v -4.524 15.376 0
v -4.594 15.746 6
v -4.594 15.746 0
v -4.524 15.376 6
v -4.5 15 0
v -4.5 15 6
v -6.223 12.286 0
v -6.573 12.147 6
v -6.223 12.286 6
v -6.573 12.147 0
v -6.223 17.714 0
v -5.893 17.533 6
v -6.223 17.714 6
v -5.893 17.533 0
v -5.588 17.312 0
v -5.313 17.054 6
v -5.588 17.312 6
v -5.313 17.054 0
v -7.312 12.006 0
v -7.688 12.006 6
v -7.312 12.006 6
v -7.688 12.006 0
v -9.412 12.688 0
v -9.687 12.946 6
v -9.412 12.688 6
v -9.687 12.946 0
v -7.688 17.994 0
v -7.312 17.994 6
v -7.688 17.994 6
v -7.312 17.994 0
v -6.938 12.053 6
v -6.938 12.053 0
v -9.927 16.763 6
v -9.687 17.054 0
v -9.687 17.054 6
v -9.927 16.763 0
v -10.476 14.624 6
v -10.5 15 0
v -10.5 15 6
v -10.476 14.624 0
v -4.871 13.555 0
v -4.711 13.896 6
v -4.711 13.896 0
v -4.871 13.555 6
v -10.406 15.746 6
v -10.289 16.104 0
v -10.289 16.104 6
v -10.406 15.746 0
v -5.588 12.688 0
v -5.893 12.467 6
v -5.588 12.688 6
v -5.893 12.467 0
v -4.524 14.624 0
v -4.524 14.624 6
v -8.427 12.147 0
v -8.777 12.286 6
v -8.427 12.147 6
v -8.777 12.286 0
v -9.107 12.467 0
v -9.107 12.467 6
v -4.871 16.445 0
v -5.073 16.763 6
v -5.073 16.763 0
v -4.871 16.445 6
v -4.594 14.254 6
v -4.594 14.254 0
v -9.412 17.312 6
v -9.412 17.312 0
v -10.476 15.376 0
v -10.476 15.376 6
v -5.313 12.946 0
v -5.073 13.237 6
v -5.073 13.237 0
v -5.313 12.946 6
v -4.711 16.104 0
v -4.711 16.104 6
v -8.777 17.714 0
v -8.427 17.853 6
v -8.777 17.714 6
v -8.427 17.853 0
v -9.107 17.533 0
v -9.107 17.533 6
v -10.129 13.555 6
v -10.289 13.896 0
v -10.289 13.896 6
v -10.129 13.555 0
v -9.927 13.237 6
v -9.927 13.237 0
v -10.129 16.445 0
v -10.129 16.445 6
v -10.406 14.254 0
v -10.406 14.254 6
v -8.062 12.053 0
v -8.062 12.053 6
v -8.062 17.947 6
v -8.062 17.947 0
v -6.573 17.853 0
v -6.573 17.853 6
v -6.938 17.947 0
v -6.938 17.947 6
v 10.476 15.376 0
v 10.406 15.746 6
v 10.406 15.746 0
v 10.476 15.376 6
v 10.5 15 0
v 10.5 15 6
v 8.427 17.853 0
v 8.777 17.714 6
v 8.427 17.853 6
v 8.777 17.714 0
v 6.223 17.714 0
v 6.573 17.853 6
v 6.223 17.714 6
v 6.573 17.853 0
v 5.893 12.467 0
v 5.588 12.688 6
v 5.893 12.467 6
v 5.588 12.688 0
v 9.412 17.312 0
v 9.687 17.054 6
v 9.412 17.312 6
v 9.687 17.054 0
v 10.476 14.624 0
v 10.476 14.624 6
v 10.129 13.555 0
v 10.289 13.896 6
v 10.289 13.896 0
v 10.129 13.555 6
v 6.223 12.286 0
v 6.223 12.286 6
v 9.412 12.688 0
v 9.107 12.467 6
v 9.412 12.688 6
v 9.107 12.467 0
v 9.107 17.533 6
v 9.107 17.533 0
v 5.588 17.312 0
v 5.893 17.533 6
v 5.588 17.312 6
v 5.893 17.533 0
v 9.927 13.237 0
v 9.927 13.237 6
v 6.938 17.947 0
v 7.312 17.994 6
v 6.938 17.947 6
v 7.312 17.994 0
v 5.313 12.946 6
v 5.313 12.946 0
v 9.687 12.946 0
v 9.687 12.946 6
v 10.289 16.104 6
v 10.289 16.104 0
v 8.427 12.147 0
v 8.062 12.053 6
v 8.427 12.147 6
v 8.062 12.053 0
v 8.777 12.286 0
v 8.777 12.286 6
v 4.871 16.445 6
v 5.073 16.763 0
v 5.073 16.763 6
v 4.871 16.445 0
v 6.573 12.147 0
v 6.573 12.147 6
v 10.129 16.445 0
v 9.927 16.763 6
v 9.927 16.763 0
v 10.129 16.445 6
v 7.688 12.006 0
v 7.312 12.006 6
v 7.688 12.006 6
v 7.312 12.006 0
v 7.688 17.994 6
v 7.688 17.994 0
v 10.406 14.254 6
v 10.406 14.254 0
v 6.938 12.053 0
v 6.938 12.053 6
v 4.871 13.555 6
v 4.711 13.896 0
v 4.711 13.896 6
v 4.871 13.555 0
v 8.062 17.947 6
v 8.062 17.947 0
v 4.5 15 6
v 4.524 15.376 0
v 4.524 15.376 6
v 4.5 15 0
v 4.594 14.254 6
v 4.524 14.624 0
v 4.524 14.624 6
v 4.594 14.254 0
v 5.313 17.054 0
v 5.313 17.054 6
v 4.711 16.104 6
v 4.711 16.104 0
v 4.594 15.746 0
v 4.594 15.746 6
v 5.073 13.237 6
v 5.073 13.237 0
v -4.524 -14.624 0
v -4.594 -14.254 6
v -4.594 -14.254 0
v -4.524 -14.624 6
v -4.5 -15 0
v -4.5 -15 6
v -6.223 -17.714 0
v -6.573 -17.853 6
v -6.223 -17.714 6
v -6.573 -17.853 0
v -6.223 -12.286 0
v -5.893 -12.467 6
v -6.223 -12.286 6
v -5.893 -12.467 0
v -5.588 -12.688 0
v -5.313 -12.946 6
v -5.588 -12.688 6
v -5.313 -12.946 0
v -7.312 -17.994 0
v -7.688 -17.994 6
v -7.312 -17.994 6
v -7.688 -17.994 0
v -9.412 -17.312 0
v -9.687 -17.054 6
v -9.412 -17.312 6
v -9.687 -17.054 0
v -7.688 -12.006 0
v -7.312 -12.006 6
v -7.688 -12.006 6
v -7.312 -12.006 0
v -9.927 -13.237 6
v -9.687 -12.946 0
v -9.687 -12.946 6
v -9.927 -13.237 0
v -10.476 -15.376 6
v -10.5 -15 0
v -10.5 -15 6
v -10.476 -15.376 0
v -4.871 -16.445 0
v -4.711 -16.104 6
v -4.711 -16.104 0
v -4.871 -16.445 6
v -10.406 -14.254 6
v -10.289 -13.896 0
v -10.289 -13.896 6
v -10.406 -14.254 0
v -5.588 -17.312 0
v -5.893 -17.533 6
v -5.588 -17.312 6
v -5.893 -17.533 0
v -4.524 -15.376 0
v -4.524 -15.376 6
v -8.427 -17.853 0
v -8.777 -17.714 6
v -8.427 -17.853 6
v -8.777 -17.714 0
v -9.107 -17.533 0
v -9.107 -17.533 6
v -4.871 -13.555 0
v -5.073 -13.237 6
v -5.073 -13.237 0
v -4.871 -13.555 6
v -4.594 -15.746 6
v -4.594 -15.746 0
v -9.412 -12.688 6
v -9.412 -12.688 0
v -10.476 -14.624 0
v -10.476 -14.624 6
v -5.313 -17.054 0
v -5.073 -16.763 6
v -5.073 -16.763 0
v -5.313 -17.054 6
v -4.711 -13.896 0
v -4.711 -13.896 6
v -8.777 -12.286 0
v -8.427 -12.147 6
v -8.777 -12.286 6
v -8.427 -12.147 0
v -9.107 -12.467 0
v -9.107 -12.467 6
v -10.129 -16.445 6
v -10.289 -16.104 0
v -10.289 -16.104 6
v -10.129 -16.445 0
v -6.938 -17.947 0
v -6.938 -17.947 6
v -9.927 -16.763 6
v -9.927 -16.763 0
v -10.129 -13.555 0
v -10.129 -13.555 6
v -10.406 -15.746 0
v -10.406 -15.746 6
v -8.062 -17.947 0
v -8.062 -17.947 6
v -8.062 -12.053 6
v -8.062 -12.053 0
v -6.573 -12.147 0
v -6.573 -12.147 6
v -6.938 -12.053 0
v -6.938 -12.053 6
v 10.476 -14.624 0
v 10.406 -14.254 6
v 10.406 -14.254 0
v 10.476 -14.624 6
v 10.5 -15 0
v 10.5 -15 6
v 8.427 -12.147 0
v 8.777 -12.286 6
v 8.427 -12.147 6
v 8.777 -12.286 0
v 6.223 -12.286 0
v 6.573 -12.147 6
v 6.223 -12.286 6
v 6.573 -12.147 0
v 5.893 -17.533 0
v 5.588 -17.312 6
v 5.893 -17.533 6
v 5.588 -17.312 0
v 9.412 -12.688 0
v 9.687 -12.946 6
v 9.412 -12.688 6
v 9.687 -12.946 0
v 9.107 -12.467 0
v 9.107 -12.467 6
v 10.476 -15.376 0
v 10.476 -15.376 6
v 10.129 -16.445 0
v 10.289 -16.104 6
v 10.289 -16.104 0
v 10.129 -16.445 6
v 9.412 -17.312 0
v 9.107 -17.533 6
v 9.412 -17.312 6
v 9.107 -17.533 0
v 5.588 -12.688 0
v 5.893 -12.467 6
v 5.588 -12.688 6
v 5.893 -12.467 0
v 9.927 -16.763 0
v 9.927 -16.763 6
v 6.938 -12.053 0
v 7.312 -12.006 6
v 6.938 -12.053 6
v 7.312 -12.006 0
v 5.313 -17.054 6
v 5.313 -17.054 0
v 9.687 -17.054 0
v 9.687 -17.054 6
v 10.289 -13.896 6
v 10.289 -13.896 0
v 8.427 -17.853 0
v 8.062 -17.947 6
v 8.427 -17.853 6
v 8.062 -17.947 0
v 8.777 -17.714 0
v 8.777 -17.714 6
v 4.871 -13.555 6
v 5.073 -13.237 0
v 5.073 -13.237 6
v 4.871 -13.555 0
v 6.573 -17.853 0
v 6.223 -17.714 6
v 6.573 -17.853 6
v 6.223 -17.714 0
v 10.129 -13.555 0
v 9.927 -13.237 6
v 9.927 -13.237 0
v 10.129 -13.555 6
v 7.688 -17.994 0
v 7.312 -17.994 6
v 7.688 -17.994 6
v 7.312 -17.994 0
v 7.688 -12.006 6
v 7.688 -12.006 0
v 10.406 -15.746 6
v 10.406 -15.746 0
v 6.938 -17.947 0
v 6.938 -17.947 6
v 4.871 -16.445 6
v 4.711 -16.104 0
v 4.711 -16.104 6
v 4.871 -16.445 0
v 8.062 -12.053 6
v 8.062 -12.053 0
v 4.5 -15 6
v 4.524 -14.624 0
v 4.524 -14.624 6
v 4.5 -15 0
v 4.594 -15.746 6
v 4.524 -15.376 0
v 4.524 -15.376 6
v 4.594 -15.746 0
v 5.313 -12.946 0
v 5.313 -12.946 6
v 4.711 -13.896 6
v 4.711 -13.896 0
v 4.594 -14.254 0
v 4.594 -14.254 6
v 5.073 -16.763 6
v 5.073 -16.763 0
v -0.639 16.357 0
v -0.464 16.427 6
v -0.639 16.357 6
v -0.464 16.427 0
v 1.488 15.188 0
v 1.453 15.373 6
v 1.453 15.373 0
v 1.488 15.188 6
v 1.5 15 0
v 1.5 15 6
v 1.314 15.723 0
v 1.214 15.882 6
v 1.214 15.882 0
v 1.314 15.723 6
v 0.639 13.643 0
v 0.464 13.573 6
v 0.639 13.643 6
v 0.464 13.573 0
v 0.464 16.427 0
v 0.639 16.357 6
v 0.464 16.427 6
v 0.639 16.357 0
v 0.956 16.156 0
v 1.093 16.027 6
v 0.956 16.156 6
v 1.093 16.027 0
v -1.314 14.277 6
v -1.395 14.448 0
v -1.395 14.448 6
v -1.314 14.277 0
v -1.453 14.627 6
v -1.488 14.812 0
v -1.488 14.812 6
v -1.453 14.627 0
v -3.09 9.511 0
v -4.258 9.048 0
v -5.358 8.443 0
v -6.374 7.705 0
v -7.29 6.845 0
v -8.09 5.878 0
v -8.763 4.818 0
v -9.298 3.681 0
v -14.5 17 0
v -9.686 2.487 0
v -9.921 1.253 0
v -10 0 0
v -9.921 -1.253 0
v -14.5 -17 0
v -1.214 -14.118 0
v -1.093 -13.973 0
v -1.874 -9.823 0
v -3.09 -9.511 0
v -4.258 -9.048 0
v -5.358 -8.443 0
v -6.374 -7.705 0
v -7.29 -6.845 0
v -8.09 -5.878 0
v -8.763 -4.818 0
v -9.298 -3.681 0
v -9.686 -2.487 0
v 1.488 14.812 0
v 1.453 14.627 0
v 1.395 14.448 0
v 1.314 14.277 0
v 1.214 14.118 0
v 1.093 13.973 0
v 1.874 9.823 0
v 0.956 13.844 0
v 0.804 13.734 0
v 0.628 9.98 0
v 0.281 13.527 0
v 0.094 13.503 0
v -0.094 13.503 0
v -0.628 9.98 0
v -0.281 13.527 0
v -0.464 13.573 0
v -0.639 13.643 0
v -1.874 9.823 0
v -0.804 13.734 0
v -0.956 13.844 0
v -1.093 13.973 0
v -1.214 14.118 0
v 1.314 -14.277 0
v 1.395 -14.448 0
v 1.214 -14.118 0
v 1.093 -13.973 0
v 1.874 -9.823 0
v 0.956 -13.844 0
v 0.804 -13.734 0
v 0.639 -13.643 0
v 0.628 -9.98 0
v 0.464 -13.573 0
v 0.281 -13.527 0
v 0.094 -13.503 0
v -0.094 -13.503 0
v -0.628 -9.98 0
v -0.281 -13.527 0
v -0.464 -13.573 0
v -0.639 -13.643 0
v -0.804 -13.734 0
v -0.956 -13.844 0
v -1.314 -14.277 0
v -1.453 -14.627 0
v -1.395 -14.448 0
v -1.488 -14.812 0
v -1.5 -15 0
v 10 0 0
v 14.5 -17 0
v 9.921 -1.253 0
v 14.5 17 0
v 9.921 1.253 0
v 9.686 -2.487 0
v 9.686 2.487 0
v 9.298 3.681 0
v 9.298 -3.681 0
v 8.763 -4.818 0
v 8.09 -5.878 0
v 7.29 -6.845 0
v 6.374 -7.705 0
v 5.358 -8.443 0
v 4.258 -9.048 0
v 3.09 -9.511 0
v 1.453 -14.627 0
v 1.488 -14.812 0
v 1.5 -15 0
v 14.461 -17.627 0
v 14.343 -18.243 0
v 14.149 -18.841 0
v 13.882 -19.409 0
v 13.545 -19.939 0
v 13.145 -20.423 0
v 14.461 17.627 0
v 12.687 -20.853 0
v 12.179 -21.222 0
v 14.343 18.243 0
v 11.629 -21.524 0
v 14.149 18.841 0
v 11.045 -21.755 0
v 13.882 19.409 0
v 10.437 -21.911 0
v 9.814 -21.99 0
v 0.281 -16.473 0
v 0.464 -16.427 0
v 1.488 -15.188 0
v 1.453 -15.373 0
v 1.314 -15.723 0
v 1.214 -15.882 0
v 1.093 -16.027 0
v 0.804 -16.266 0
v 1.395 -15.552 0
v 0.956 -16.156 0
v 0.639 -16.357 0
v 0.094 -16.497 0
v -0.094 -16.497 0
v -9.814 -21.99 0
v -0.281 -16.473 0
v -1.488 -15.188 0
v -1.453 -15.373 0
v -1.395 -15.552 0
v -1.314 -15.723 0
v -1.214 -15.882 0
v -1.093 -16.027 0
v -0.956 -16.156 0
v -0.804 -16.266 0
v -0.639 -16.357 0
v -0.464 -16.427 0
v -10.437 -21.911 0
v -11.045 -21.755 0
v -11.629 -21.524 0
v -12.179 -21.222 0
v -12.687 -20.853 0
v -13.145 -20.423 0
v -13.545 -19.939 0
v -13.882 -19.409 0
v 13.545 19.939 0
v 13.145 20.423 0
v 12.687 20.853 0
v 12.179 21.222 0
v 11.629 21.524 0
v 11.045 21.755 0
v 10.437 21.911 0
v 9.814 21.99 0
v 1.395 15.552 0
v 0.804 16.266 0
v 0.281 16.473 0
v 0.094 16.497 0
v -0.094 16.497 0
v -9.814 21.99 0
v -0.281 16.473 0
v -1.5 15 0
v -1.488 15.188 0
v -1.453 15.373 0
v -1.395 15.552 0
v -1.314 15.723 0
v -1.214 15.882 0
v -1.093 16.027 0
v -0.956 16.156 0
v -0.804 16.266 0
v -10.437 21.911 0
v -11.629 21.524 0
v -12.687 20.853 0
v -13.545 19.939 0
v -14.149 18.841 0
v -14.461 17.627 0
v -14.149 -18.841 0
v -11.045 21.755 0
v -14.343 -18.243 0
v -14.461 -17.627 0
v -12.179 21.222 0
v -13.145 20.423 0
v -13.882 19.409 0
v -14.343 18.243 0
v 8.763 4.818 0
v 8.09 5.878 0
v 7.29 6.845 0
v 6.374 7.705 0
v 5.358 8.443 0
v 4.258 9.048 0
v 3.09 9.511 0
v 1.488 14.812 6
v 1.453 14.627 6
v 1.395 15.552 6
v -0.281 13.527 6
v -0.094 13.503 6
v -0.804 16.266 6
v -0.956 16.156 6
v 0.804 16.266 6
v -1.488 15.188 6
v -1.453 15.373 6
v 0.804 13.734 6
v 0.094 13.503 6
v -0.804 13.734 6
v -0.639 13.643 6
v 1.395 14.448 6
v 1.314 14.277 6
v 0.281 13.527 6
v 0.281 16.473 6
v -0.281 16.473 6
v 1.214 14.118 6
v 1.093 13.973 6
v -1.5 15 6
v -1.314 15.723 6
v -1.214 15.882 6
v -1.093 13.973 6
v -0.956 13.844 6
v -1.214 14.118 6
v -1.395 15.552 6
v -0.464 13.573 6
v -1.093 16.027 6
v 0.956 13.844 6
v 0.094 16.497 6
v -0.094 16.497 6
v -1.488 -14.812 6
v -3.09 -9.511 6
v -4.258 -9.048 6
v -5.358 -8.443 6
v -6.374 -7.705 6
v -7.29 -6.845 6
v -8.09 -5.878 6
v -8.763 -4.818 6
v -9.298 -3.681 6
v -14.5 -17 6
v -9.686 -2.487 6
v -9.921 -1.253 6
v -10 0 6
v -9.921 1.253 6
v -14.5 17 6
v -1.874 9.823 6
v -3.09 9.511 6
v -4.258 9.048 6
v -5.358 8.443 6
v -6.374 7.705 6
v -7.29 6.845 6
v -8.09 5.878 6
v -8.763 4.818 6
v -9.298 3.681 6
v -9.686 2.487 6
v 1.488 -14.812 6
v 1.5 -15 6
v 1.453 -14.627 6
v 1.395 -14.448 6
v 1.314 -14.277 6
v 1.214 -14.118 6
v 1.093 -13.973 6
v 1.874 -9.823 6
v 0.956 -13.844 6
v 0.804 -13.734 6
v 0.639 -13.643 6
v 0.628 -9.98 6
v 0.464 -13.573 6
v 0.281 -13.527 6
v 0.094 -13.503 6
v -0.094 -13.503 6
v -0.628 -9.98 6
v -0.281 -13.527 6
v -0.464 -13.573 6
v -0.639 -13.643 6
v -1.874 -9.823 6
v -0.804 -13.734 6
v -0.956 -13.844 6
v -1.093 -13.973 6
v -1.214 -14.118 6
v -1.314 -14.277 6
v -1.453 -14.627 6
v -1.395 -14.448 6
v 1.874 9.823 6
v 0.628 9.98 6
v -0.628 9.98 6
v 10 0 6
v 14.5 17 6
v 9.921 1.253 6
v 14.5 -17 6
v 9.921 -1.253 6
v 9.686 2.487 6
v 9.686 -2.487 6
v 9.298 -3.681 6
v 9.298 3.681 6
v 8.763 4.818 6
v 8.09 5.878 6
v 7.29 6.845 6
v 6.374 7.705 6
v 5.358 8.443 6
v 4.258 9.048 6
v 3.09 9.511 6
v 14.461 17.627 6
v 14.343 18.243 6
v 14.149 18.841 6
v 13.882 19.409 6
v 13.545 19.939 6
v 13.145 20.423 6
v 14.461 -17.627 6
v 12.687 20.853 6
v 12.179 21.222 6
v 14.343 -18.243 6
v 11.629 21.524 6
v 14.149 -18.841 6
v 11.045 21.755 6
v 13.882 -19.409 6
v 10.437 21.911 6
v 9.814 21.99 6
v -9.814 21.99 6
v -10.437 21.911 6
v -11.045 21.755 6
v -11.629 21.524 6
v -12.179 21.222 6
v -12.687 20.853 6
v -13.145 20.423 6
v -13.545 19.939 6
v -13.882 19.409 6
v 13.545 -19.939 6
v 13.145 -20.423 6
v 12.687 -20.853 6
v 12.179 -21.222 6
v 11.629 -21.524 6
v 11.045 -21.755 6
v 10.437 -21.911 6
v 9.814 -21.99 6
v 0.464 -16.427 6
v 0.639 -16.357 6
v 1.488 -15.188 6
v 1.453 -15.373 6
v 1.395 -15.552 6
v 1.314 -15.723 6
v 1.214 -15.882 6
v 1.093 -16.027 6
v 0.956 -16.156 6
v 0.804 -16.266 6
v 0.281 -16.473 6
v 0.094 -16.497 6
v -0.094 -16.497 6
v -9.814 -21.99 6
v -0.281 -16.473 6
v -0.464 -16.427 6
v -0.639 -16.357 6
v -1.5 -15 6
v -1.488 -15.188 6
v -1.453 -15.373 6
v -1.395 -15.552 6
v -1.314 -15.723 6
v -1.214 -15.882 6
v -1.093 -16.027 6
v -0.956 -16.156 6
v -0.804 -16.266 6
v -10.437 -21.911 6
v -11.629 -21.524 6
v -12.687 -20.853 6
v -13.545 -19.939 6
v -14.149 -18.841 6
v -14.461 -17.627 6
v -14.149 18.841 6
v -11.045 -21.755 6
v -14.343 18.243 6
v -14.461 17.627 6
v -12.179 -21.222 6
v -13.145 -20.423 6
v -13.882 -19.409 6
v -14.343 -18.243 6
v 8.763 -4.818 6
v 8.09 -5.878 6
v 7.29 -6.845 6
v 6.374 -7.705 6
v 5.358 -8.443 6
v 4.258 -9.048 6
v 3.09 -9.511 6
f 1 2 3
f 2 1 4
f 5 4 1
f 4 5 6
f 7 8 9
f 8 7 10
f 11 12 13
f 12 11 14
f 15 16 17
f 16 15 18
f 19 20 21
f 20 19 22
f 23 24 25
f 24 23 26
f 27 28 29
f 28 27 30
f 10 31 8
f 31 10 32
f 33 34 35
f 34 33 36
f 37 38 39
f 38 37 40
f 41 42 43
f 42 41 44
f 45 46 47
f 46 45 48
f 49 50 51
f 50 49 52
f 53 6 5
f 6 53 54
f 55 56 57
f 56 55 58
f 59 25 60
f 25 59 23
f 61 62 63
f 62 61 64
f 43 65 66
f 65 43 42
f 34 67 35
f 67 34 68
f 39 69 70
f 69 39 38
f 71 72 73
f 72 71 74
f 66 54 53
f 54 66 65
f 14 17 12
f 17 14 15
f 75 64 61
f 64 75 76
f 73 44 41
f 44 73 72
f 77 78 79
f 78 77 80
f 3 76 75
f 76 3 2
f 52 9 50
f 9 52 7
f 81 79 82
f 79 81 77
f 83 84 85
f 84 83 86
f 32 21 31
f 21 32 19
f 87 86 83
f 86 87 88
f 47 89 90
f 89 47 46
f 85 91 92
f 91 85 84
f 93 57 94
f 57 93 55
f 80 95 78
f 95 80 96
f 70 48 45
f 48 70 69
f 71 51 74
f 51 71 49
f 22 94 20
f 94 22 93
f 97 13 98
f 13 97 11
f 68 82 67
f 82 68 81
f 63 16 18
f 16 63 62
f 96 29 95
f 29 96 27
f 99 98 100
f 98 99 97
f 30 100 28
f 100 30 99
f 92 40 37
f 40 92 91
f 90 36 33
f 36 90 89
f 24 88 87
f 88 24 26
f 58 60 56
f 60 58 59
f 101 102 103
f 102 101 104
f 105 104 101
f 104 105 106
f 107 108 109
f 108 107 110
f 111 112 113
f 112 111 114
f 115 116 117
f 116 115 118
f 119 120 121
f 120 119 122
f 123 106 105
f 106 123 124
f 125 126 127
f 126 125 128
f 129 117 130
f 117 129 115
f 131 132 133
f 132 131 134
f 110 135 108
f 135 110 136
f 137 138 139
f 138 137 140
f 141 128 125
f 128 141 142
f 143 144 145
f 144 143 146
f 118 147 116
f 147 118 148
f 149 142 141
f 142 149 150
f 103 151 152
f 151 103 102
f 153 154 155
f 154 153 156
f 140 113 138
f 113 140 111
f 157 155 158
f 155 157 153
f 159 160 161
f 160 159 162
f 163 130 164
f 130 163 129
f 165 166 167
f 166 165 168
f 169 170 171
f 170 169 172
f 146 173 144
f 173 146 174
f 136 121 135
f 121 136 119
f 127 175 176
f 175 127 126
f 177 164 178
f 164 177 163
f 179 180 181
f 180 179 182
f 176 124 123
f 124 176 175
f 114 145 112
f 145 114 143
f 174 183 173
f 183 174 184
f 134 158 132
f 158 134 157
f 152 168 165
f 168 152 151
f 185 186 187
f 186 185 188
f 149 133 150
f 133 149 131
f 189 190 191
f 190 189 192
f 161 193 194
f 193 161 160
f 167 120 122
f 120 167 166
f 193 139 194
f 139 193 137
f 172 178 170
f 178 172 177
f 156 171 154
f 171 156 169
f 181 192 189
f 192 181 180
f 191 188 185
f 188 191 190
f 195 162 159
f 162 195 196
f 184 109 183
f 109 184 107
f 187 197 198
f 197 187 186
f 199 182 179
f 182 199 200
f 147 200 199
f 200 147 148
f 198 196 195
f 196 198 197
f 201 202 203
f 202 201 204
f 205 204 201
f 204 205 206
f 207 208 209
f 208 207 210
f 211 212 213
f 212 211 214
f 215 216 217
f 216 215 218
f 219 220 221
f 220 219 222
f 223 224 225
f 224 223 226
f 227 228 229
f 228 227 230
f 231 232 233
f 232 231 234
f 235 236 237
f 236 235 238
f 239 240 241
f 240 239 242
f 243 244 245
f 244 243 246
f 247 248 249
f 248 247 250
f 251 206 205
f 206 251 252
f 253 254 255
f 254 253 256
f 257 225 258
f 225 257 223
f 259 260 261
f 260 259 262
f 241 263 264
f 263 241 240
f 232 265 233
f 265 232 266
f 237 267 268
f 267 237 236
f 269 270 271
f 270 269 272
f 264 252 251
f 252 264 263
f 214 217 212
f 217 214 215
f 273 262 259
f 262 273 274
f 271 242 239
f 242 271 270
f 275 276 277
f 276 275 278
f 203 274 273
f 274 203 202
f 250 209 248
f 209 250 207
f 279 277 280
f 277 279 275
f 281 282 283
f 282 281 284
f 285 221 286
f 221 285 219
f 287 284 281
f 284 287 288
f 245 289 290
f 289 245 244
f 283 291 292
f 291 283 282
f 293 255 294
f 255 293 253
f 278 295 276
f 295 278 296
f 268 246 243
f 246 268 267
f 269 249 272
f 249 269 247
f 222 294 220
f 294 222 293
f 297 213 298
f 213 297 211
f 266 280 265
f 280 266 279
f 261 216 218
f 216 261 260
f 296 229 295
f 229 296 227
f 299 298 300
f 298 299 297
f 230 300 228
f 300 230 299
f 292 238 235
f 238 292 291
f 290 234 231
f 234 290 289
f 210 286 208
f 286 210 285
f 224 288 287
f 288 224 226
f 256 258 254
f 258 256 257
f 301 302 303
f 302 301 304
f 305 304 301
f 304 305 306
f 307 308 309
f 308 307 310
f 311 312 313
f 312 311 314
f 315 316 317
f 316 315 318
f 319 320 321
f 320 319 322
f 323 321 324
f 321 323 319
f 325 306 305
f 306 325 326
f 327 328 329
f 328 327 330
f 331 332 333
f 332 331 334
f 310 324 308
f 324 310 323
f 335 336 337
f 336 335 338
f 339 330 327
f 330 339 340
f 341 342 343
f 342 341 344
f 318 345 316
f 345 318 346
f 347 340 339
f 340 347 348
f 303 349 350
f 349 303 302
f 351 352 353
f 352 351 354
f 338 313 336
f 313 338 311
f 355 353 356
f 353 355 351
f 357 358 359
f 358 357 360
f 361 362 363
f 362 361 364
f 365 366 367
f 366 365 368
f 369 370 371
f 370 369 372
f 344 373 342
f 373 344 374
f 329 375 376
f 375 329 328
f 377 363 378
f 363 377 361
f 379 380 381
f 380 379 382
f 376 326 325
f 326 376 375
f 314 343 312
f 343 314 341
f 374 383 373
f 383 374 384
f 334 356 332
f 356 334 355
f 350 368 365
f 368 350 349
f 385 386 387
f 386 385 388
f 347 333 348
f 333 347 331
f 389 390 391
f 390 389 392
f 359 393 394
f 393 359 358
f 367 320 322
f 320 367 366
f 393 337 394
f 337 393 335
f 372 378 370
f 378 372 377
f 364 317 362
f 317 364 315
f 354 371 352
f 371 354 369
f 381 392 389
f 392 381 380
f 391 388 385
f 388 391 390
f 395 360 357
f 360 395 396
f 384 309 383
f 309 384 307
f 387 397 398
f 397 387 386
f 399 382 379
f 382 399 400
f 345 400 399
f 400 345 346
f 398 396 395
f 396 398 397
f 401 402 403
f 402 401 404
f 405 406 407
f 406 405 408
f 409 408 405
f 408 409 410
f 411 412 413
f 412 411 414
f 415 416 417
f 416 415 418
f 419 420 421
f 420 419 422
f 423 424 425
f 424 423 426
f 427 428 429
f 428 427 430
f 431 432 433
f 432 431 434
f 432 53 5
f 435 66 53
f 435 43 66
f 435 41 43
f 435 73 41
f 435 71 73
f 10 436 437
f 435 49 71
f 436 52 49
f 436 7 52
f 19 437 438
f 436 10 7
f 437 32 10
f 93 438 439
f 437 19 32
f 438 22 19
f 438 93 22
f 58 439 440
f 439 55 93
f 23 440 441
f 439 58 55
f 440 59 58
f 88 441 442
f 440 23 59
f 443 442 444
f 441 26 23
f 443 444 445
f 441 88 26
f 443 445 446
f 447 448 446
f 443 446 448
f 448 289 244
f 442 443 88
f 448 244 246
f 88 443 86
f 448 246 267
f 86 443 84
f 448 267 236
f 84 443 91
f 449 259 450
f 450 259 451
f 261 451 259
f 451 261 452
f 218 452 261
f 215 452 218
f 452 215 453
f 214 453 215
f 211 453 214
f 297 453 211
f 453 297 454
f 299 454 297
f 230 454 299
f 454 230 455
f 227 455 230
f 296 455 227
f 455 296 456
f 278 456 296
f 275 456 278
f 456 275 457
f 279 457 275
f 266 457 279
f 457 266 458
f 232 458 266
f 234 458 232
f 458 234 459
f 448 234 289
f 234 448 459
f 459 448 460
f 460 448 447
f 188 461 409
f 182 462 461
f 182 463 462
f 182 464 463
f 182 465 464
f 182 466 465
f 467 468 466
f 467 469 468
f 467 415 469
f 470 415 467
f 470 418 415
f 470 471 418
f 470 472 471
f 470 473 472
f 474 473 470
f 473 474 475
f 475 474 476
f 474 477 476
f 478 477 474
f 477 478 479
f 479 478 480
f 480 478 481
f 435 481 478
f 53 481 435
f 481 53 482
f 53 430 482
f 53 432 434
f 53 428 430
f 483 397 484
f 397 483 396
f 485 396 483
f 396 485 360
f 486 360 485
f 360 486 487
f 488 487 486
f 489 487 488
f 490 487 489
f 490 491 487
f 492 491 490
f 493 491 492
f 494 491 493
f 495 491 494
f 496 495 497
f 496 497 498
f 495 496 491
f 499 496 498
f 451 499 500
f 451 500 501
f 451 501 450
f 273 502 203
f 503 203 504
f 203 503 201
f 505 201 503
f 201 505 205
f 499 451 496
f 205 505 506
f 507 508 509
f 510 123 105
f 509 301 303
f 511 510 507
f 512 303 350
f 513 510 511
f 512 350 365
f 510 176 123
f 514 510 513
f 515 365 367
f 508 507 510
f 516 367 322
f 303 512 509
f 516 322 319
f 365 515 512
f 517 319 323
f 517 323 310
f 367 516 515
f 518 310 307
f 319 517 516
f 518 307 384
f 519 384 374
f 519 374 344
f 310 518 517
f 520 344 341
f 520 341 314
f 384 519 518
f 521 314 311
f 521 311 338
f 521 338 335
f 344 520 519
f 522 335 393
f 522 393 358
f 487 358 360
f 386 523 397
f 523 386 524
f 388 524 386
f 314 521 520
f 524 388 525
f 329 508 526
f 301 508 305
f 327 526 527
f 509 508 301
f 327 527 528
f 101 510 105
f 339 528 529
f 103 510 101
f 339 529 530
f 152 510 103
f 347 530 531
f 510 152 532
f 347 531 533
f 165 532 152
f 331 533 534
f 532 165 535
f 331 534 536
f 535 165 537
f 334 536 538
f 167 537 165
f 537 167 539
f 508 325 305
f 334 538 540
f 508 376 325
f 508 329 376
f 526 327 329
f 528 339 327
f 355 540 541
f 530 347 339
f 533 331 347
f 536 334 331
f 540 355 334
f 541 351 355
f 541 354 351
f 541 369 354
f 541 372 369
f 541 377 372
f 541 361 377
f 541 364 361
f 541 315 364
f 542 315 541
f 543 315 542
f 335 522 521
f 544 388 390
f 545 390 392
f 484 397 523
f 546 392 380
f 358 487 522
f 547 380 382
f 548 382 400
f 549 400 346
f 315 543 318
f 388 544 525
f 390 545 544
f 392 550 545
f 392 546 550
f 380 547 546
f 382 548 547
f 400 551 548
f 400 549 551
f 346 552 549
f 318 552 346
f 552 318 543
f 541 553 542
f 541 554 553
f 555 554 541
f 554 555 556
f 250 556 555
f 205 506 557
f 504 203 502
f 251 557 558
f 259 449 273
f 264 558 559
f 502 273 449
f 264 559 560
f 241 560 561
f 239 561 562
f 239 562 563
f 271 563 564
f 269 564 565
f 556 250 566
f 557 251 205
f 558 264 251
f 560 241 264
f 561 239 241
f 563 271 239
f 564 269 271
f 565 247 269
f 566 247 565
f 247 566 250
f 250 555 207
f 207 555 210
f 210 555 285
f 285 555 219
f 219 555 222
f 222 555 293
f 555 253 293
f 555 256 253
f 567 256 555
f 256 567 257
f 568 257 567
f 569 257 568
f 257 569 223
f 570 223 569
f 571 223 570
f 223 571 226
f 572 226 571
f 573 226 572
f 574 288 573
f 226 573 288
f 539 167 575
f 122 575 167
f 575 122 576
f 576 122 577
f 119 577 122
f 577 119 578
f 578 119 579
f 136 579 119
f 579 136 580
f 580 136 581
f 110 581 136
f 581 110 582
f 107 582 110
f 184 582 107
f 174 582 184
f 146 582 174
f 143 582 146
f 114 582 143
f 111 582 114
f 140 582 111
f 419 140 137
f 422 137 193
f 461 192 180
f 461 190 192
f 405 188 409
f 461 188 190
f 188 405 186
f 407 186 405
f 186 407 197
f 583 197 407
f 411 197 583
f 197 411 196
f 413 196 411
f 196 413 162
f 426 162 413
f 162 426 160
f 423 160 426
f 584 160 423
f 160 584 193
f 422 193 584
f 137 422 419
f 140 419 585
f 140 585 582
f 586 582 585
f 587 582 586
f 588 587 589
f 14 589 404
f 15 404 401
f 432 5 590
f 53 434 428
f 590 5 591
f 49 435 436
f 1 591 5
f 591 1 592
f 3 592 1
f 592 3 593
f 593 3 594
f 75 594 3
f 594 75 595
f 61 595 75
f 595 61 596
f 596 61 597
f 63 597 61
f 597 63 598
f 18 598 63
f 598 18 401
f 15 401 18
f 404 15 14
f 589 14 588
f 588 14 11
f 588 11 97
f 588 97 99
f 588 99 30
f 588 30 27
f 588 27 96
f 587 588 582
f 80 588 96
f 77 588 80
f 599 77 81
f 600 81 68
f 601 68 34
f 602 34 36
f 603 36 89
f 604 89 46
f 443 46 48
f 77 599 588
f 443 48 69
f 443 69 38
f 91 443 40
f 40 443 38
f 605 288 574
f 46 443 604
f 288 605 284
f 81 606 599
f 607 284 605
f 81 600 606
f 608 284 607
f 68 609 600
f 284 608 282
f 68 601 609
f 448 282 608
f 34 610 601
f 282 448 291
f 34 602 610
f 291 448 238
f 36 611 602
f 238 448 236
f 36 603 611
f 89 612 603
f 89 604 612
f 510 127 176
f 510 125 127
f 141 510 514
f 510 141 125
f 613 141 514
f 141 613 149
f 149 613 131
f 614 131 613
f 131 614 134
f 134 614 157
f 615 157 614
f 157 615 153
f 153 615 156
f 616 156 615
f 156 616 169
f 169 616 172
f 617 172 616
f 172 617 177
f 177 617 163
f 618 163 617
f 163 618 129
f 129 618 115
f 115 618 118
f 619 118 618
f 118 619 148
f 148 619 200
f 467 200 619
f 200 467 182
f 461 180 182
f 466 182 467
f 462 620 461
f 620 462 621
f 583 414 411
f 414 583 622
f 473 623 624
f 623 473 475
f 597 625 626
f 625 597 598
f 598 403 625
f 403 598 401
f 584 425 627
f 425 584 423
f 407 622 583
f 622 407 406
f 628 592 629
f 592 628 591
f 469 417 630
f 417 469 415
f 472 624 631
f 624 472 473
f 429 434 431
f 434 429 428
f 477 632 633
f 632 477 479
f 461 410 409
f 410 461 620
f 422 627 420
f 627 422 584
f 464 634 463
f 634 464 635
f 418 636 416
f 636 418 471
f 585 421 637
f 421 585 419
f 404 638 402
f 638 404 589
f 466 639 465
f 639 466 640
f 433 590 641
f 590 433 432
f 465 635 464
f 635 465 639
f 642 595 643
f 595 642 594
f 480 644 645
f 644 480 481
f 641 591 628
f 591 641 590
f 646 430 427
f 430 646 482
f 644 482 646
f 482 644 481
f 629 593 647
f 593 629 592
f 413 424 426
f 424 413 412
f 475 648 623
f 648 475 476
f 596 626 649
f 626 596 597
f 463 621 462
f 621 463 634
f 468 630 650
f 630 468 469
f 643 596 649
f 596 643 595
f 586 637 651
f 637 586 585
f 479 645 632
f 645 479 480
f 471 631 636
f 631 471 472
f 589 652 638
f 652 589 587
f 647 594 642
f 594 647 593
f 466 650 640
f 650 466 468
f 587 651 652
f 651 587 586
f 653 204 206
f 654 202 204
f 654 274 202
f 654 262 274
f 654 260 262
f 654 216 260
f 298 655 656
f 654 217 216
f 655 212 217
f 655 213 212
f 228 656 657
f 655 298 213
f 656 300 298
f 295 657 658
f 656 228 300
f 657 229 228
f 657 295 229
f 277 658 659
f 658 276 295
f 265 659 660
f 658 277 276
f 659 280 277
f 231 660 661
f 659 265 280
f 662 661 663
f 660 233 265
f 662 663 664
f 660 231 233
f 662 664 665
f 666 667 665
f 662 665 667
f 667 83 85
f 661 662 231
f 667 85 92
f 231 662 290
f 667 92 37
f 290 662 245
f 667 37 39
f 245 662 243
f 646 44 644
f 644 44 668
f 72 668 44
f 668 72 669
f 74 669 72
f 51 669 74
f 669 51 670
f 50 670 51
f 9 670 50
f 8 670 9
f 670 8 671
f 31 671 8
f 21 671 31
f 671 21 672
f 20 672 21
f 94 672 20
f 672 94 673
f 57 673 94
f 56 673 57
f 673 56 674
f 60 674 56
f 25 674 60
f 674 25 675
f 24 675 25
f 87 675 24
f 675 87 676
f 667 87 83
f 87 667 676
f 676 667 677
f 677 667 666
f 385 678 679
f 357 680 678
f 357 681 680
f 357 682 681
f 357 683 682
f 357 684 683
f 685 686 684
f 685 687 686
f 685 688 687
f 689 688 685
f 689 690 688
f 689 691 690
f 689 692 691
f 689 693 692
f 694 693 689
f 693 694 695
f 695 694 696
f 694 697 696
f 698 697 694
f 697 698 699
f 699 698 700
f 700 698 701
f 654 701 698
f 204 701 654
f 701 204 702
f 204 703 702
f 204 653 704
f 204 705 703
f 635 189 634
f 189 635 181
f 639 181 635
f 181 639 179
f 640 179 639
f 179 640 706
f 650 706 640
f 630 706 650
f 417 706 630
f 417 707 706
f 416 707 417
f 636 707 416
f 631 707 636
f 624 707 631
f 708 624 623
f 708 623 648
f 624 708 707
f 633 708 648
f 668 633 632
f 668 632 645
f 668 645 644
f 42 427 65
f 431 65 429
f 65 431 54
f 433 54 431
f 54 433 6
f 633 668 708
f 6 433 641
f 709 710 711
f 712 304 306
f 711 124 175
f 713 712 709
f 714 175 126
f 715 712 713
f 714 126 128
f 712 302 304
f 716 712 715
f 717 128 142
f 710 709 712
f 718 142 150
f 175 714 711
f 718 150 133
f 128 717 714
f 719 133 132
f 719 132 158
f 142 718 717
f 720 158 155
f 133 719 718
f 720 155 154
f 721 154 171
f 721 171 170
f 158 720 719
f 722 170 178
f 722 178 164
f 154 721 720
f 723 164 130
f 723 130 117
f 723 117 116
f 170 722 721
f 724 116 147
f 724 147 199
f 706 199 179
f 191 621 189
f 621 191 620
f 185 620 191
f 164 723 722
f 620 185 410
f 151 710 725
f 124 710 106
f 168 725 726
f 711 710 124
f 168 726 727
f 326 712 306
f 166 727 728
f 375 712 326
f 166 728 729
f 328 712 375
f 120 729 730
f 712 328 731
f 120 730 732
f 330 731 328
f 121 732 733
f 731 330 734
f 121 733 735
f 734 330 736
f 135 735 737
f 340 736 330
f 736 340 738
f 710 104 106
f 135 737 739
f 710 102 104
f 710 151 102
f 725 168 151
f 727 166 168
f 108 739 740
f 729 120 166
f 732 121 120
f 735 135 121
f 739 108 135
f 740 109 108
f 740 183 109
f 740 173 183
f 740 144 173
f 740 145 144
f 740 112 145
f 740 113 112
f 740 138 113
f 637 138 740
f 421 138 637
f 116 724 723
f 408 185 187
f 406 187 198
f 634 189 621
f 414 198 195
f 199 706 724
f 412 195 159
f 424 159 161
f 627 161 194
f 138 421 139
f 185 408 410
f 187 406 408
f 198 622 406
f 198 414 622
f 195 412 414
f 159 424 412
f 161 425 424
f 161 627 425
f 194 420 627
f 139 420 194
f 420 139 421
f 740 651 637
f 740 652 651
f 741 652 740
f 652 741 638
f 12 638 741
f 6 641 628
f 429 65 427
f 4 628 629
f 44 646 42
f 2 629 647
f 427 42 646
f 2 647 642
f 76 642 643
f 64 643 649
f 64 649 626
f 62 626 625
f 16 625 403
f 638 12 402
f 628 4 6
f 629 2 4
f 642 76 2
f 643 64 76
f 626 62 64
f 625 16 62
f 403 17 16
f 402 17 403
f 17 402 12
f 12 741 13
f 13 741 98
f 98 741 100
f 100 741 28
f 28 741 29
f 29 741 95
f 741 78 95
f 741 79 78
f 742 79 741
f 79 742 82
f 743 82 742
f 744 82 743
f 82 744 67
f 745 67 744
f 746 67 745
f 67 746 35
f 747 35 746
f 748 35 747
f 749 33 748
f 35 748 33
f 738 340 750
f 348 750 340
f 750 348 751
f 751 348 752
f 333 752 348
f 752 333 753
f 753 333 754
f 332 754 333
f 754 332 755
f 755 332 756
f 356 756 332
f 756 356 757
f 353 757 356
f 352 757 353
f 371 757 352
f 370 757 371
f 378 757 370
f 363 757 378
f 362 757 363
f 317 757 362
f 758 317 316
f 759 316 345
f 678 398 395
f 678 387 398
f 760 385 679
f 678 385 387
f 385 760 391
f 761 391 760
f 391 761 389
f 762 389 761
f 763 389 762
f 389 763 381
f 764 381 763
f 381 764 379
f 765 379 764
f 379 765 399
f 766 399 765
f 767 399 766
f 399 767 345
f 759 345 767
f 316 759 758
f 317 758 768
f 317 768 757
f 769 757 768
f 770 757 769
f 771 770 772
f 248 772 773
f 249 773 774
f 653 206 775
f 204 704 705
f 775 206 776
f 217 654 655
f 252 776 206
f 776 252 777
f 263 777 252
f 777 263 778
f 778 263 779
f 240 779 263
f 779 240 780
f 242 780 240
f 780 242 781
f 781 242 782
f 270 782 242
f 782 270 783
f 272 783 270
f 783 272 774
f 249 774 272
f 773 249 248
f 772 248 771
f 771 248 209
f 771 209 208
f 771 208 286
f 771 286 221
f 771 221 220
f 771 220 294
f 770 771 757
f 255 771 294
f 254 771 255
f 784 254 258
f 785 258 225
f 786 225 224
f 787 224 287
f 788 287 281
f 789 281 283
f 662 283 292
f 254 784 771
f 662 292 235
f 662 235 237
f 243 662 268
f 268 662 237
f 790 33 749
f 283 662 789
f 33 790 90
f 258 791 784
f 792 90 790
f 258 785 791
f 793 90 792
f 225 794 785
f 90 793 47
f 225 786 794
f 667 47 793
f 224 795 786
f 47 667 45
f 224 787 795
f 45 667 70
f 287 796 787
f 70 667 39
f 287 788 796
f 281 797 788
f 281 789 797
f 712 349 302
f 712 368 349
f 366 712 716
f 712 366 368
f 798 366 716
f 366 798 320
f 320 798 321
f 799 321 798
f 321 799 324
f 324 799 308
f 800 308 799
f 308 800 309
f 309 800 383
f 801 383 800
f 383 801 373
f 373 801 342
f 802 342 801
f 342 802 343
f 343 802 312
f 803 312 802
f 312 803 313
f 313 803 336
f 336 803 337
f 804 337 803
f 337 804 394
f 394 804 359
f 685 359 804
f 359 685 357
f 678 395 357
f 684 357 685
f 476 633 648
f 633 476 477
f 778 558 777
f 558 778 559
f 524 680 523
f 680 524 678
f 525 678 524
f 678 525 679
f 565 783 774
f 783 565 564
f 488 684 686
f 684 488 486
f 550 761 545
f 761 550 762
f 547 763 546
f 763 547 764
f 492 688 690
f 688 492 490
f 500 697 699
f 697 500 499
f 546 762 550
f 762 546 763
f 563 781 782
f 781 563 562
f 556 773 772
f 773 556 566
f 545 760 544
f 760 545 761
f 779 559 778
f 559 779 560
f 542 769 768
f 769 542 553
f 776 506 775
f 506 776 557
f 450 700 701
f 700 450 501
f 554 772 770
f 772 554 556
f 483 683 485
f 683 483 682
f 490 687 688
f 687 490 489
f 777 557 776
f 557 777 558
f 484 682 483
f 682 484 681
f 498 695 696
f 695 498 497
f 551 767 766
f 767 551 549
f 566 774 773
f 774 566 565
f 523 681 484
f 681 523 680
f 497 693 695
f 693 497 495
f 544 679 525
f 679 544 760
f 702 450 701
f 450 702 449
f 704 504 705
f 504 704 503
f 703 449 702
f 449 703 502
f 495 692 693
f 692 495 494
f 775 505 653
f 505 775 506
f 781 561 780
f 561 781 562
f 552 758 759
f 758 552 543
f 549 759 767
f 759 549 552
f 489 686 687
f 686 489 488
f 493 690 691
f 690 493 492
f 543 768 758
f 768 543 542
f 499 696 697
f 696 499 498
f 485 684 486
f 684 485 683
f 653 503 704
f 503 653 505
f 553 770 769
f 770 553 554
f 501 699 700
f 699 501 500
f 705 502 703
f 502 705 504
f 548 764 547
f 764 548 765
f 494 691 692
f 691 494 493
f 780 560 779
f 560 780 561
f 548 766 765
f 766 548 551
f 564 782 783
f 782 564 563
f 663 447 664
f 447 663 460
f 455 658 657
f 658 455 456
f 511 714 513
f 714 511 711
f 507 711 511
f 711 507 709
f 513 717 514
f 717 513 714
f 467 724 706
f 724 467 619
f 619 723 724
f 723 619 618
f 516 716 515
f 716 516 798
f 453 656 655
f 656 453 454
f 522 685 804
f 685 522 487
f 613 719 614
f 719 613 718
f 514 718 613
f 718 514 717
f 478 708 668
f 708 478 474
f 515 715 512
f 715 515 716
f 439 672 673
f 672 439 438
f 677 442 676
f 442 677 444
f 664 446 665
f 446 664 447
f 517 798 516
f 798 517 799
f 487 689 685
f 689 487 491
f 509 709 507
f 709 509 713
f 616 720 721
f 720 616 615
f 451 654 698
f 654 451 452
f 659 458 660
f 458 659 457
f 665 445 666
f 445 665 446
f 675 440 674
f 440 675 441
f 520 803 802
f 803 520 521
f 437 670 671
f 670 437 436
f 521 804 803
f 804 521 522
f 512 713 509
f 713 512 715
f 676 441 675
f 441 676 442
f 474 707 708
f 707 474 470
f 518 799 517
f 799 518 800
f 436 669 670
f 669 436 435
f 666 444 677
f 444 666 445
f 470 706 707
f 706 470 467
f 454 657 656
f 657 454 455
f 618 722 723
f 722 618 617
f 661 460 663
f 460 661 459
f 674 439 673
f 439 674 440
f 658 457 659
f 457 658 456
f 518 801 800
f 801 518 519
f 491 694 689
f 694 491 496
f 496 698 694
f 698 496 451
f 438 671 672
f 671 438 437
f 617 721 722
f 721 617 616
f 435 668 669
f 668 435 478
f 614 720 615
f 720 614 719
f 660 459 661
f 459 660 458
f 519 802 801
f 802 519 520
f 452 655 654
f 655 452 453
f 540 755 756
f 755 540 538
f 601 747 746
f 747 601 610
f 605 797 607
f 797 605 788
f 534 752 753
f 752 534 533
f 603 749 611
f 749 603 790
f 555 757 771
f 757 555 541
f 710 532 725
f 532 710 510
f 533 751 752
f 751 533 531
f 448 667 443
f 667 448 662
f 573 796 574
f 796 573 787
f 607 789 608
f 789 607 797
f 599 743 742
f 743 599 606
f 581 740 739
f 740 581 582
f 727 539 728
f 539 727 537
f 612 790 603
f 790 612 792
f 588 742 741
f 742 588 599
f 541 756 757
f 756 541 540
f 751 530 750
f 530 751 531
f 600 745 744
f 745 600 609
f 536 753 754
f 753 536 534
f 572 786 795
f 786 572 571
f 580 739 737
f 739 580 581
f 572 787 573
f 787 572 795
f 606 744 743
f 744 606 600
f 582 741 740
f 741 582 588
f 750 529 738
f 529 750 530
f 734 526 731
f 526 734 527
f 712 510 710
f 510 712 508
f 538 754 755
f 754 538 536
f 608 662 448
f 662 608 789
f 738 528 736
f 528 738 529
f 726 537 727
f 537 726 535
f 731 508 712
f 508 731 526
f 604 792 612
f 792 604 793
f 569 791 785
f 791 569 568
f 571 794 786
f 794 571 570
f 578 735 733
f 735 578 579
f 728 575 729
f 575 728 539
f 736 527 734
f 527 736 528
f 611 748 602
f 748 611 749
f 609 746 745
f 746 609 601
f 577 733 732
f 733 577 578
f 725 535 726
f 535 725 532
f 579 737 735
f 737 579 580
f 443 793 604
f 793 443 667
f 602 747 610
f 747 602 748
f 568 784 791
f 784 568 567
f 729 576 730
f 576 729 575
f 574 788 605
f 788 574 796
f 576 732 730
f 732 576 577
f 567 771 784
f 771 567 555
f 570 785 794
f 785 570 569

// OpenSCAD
$fn = 50;


difference() {
	union() {
		hull() {
			translate(v = [-9.5000000000, 17.0000000000, 0]) {
				cylinder(h = 6, r = 5);
			}
			translate(v = [9.5000000000, 17.0000000000, 0]) {
				cylinder(h = 6, r = 5);
			}
			translate(v = [-9.5000000000, -17.0000000000, 0]) {
				cylinder(h = 6, r = 5);
			}
			translate(v = [9.5000000000, -17.0000000000, 0]) {
				cylinder(h = 6, r = 5);
			}
		}
	}
	union() {
		#translate(v = [-7.5000000000, 15.0000000000, 0]) {
			cylinder(h = 6, r = 3.0000000000);
		}
		#translate(v = [7.5000000000, 15.0000000000, 0]) {
			cylinder(h = 6, r = 3.0000000000);
		}
		#translate(v = [-7.5000000000, -15.0000000000, 0]) {
			cylinder(h = 6, r = 3.0000000000);
		}
		#translate(v = [7.5000000000, -15.0000000000, 0]) {
			cylinder(h = 6, r = 3.0000000000);
		}
		#translate(v = [-7.5000000000, -15.0000000000, -100.0000000000]) {
			cylinder(h = 200, r = 3.0000000000);
		}
		#translate(v = [-7.5000000000, 15.0000000000, -100.0000000000]) {
			cylinder(h = 200, r = 3.0000000000);
		}
		#translate(v = [7.5000000000, -15.0000000000, -100.0000000000]) {
			cylinder(h = 200, r = 3.0000000000);
		}
		#translate(v = [7.5000000000, 15.0000000000, -100.0000000000]) {
			cylinder(h = 200, r = 3.0000000000);
		}
		#translate(v = [-7.5000000000, 15.0000000000, 0]) {
			cylinder(h = 6, r = 1.5000000000);
		}
		#translate(v = [0.0000000000, 15.0000000000, 0]) {
			cylinder(h = 6, r = 1.5000000000);
		}
		#translate(v = [7.5000000000, 15.0000000000, 0]) {
			cylinder(h = 6, r = 1.5000000000);
		}
		#translate(v = [-7.5000000000, -15.0000000000, 0]) {
			cylinder(h = 6, r = 1.5000000000);
		}
		#translate(v = [0.0000000000, -15.0000000000, 0]) {
			cylinder(h = 6, r = 1.5000000000);
		}
		#translate(v = [7.5000000000, -15.0000000000, 0]) {
			cylinder(h = 6, r = 1.5000000000);
		}
		#translate(v = [-7.5000000000, 15.0000000000, 0]) {
			cylinder(h = 6, r = 1.5000000000);
		}
		#translate(v = [0.0000000000, 15.0000000000, 0]) {
			cylinder(h = 6, r = 1.5000000000);
		}
		#translate(v = [7.5000000000, 15.0000000000, 0]) {
			cylinder(h = 6, r = 1.5000000000);
		}
		#translate(v = [-7.5000000000, -15.0000000000, 0]) {
			cylinder(h = 6, r = 1.5000000000);
		}
		#translate(v = [0.0000000000, -15.0000000000, 0]) {
			cylinder(h = 6, r = 1.5000000000);
		}
		#translate(v = [7.5000000000, -15.0000000000, 0]) {
			cylinder(h = 6, r = 1.5000000000);
		}
		#translate(v = [-7.5000000000, 15.0000000000, 0]) {
			cylinder(h = 6, r = 1.5000000000);
		}
		#translate(v = [0.0000000000, 15.0000000000, 0]) {
			cylinder(h = 6, r = 1.5000000000);
		}
		#translate(v = [7.5000000000, 15.0000000000, 0]) {
			cylinder(h = 6, r = 1.5000000000);
		}
		#translate(v = [-7.5000000000, -15.0000000000, 0]) {
			cylinder(h = 6, r = 1.5000000000);
		}
		#translate(v = [0.0000000000, -15.0000000000, 0]) {
			cylinder(h = 6, r = 1.5000000000);
		}
		#translate(v = [7.5000000000, -15.0000000000, 0]) {
			cylinder(h = 6, r = 1.5000000000);
		}
		#cylinder(h = 6, r = 10.0000000000);
	}
}
